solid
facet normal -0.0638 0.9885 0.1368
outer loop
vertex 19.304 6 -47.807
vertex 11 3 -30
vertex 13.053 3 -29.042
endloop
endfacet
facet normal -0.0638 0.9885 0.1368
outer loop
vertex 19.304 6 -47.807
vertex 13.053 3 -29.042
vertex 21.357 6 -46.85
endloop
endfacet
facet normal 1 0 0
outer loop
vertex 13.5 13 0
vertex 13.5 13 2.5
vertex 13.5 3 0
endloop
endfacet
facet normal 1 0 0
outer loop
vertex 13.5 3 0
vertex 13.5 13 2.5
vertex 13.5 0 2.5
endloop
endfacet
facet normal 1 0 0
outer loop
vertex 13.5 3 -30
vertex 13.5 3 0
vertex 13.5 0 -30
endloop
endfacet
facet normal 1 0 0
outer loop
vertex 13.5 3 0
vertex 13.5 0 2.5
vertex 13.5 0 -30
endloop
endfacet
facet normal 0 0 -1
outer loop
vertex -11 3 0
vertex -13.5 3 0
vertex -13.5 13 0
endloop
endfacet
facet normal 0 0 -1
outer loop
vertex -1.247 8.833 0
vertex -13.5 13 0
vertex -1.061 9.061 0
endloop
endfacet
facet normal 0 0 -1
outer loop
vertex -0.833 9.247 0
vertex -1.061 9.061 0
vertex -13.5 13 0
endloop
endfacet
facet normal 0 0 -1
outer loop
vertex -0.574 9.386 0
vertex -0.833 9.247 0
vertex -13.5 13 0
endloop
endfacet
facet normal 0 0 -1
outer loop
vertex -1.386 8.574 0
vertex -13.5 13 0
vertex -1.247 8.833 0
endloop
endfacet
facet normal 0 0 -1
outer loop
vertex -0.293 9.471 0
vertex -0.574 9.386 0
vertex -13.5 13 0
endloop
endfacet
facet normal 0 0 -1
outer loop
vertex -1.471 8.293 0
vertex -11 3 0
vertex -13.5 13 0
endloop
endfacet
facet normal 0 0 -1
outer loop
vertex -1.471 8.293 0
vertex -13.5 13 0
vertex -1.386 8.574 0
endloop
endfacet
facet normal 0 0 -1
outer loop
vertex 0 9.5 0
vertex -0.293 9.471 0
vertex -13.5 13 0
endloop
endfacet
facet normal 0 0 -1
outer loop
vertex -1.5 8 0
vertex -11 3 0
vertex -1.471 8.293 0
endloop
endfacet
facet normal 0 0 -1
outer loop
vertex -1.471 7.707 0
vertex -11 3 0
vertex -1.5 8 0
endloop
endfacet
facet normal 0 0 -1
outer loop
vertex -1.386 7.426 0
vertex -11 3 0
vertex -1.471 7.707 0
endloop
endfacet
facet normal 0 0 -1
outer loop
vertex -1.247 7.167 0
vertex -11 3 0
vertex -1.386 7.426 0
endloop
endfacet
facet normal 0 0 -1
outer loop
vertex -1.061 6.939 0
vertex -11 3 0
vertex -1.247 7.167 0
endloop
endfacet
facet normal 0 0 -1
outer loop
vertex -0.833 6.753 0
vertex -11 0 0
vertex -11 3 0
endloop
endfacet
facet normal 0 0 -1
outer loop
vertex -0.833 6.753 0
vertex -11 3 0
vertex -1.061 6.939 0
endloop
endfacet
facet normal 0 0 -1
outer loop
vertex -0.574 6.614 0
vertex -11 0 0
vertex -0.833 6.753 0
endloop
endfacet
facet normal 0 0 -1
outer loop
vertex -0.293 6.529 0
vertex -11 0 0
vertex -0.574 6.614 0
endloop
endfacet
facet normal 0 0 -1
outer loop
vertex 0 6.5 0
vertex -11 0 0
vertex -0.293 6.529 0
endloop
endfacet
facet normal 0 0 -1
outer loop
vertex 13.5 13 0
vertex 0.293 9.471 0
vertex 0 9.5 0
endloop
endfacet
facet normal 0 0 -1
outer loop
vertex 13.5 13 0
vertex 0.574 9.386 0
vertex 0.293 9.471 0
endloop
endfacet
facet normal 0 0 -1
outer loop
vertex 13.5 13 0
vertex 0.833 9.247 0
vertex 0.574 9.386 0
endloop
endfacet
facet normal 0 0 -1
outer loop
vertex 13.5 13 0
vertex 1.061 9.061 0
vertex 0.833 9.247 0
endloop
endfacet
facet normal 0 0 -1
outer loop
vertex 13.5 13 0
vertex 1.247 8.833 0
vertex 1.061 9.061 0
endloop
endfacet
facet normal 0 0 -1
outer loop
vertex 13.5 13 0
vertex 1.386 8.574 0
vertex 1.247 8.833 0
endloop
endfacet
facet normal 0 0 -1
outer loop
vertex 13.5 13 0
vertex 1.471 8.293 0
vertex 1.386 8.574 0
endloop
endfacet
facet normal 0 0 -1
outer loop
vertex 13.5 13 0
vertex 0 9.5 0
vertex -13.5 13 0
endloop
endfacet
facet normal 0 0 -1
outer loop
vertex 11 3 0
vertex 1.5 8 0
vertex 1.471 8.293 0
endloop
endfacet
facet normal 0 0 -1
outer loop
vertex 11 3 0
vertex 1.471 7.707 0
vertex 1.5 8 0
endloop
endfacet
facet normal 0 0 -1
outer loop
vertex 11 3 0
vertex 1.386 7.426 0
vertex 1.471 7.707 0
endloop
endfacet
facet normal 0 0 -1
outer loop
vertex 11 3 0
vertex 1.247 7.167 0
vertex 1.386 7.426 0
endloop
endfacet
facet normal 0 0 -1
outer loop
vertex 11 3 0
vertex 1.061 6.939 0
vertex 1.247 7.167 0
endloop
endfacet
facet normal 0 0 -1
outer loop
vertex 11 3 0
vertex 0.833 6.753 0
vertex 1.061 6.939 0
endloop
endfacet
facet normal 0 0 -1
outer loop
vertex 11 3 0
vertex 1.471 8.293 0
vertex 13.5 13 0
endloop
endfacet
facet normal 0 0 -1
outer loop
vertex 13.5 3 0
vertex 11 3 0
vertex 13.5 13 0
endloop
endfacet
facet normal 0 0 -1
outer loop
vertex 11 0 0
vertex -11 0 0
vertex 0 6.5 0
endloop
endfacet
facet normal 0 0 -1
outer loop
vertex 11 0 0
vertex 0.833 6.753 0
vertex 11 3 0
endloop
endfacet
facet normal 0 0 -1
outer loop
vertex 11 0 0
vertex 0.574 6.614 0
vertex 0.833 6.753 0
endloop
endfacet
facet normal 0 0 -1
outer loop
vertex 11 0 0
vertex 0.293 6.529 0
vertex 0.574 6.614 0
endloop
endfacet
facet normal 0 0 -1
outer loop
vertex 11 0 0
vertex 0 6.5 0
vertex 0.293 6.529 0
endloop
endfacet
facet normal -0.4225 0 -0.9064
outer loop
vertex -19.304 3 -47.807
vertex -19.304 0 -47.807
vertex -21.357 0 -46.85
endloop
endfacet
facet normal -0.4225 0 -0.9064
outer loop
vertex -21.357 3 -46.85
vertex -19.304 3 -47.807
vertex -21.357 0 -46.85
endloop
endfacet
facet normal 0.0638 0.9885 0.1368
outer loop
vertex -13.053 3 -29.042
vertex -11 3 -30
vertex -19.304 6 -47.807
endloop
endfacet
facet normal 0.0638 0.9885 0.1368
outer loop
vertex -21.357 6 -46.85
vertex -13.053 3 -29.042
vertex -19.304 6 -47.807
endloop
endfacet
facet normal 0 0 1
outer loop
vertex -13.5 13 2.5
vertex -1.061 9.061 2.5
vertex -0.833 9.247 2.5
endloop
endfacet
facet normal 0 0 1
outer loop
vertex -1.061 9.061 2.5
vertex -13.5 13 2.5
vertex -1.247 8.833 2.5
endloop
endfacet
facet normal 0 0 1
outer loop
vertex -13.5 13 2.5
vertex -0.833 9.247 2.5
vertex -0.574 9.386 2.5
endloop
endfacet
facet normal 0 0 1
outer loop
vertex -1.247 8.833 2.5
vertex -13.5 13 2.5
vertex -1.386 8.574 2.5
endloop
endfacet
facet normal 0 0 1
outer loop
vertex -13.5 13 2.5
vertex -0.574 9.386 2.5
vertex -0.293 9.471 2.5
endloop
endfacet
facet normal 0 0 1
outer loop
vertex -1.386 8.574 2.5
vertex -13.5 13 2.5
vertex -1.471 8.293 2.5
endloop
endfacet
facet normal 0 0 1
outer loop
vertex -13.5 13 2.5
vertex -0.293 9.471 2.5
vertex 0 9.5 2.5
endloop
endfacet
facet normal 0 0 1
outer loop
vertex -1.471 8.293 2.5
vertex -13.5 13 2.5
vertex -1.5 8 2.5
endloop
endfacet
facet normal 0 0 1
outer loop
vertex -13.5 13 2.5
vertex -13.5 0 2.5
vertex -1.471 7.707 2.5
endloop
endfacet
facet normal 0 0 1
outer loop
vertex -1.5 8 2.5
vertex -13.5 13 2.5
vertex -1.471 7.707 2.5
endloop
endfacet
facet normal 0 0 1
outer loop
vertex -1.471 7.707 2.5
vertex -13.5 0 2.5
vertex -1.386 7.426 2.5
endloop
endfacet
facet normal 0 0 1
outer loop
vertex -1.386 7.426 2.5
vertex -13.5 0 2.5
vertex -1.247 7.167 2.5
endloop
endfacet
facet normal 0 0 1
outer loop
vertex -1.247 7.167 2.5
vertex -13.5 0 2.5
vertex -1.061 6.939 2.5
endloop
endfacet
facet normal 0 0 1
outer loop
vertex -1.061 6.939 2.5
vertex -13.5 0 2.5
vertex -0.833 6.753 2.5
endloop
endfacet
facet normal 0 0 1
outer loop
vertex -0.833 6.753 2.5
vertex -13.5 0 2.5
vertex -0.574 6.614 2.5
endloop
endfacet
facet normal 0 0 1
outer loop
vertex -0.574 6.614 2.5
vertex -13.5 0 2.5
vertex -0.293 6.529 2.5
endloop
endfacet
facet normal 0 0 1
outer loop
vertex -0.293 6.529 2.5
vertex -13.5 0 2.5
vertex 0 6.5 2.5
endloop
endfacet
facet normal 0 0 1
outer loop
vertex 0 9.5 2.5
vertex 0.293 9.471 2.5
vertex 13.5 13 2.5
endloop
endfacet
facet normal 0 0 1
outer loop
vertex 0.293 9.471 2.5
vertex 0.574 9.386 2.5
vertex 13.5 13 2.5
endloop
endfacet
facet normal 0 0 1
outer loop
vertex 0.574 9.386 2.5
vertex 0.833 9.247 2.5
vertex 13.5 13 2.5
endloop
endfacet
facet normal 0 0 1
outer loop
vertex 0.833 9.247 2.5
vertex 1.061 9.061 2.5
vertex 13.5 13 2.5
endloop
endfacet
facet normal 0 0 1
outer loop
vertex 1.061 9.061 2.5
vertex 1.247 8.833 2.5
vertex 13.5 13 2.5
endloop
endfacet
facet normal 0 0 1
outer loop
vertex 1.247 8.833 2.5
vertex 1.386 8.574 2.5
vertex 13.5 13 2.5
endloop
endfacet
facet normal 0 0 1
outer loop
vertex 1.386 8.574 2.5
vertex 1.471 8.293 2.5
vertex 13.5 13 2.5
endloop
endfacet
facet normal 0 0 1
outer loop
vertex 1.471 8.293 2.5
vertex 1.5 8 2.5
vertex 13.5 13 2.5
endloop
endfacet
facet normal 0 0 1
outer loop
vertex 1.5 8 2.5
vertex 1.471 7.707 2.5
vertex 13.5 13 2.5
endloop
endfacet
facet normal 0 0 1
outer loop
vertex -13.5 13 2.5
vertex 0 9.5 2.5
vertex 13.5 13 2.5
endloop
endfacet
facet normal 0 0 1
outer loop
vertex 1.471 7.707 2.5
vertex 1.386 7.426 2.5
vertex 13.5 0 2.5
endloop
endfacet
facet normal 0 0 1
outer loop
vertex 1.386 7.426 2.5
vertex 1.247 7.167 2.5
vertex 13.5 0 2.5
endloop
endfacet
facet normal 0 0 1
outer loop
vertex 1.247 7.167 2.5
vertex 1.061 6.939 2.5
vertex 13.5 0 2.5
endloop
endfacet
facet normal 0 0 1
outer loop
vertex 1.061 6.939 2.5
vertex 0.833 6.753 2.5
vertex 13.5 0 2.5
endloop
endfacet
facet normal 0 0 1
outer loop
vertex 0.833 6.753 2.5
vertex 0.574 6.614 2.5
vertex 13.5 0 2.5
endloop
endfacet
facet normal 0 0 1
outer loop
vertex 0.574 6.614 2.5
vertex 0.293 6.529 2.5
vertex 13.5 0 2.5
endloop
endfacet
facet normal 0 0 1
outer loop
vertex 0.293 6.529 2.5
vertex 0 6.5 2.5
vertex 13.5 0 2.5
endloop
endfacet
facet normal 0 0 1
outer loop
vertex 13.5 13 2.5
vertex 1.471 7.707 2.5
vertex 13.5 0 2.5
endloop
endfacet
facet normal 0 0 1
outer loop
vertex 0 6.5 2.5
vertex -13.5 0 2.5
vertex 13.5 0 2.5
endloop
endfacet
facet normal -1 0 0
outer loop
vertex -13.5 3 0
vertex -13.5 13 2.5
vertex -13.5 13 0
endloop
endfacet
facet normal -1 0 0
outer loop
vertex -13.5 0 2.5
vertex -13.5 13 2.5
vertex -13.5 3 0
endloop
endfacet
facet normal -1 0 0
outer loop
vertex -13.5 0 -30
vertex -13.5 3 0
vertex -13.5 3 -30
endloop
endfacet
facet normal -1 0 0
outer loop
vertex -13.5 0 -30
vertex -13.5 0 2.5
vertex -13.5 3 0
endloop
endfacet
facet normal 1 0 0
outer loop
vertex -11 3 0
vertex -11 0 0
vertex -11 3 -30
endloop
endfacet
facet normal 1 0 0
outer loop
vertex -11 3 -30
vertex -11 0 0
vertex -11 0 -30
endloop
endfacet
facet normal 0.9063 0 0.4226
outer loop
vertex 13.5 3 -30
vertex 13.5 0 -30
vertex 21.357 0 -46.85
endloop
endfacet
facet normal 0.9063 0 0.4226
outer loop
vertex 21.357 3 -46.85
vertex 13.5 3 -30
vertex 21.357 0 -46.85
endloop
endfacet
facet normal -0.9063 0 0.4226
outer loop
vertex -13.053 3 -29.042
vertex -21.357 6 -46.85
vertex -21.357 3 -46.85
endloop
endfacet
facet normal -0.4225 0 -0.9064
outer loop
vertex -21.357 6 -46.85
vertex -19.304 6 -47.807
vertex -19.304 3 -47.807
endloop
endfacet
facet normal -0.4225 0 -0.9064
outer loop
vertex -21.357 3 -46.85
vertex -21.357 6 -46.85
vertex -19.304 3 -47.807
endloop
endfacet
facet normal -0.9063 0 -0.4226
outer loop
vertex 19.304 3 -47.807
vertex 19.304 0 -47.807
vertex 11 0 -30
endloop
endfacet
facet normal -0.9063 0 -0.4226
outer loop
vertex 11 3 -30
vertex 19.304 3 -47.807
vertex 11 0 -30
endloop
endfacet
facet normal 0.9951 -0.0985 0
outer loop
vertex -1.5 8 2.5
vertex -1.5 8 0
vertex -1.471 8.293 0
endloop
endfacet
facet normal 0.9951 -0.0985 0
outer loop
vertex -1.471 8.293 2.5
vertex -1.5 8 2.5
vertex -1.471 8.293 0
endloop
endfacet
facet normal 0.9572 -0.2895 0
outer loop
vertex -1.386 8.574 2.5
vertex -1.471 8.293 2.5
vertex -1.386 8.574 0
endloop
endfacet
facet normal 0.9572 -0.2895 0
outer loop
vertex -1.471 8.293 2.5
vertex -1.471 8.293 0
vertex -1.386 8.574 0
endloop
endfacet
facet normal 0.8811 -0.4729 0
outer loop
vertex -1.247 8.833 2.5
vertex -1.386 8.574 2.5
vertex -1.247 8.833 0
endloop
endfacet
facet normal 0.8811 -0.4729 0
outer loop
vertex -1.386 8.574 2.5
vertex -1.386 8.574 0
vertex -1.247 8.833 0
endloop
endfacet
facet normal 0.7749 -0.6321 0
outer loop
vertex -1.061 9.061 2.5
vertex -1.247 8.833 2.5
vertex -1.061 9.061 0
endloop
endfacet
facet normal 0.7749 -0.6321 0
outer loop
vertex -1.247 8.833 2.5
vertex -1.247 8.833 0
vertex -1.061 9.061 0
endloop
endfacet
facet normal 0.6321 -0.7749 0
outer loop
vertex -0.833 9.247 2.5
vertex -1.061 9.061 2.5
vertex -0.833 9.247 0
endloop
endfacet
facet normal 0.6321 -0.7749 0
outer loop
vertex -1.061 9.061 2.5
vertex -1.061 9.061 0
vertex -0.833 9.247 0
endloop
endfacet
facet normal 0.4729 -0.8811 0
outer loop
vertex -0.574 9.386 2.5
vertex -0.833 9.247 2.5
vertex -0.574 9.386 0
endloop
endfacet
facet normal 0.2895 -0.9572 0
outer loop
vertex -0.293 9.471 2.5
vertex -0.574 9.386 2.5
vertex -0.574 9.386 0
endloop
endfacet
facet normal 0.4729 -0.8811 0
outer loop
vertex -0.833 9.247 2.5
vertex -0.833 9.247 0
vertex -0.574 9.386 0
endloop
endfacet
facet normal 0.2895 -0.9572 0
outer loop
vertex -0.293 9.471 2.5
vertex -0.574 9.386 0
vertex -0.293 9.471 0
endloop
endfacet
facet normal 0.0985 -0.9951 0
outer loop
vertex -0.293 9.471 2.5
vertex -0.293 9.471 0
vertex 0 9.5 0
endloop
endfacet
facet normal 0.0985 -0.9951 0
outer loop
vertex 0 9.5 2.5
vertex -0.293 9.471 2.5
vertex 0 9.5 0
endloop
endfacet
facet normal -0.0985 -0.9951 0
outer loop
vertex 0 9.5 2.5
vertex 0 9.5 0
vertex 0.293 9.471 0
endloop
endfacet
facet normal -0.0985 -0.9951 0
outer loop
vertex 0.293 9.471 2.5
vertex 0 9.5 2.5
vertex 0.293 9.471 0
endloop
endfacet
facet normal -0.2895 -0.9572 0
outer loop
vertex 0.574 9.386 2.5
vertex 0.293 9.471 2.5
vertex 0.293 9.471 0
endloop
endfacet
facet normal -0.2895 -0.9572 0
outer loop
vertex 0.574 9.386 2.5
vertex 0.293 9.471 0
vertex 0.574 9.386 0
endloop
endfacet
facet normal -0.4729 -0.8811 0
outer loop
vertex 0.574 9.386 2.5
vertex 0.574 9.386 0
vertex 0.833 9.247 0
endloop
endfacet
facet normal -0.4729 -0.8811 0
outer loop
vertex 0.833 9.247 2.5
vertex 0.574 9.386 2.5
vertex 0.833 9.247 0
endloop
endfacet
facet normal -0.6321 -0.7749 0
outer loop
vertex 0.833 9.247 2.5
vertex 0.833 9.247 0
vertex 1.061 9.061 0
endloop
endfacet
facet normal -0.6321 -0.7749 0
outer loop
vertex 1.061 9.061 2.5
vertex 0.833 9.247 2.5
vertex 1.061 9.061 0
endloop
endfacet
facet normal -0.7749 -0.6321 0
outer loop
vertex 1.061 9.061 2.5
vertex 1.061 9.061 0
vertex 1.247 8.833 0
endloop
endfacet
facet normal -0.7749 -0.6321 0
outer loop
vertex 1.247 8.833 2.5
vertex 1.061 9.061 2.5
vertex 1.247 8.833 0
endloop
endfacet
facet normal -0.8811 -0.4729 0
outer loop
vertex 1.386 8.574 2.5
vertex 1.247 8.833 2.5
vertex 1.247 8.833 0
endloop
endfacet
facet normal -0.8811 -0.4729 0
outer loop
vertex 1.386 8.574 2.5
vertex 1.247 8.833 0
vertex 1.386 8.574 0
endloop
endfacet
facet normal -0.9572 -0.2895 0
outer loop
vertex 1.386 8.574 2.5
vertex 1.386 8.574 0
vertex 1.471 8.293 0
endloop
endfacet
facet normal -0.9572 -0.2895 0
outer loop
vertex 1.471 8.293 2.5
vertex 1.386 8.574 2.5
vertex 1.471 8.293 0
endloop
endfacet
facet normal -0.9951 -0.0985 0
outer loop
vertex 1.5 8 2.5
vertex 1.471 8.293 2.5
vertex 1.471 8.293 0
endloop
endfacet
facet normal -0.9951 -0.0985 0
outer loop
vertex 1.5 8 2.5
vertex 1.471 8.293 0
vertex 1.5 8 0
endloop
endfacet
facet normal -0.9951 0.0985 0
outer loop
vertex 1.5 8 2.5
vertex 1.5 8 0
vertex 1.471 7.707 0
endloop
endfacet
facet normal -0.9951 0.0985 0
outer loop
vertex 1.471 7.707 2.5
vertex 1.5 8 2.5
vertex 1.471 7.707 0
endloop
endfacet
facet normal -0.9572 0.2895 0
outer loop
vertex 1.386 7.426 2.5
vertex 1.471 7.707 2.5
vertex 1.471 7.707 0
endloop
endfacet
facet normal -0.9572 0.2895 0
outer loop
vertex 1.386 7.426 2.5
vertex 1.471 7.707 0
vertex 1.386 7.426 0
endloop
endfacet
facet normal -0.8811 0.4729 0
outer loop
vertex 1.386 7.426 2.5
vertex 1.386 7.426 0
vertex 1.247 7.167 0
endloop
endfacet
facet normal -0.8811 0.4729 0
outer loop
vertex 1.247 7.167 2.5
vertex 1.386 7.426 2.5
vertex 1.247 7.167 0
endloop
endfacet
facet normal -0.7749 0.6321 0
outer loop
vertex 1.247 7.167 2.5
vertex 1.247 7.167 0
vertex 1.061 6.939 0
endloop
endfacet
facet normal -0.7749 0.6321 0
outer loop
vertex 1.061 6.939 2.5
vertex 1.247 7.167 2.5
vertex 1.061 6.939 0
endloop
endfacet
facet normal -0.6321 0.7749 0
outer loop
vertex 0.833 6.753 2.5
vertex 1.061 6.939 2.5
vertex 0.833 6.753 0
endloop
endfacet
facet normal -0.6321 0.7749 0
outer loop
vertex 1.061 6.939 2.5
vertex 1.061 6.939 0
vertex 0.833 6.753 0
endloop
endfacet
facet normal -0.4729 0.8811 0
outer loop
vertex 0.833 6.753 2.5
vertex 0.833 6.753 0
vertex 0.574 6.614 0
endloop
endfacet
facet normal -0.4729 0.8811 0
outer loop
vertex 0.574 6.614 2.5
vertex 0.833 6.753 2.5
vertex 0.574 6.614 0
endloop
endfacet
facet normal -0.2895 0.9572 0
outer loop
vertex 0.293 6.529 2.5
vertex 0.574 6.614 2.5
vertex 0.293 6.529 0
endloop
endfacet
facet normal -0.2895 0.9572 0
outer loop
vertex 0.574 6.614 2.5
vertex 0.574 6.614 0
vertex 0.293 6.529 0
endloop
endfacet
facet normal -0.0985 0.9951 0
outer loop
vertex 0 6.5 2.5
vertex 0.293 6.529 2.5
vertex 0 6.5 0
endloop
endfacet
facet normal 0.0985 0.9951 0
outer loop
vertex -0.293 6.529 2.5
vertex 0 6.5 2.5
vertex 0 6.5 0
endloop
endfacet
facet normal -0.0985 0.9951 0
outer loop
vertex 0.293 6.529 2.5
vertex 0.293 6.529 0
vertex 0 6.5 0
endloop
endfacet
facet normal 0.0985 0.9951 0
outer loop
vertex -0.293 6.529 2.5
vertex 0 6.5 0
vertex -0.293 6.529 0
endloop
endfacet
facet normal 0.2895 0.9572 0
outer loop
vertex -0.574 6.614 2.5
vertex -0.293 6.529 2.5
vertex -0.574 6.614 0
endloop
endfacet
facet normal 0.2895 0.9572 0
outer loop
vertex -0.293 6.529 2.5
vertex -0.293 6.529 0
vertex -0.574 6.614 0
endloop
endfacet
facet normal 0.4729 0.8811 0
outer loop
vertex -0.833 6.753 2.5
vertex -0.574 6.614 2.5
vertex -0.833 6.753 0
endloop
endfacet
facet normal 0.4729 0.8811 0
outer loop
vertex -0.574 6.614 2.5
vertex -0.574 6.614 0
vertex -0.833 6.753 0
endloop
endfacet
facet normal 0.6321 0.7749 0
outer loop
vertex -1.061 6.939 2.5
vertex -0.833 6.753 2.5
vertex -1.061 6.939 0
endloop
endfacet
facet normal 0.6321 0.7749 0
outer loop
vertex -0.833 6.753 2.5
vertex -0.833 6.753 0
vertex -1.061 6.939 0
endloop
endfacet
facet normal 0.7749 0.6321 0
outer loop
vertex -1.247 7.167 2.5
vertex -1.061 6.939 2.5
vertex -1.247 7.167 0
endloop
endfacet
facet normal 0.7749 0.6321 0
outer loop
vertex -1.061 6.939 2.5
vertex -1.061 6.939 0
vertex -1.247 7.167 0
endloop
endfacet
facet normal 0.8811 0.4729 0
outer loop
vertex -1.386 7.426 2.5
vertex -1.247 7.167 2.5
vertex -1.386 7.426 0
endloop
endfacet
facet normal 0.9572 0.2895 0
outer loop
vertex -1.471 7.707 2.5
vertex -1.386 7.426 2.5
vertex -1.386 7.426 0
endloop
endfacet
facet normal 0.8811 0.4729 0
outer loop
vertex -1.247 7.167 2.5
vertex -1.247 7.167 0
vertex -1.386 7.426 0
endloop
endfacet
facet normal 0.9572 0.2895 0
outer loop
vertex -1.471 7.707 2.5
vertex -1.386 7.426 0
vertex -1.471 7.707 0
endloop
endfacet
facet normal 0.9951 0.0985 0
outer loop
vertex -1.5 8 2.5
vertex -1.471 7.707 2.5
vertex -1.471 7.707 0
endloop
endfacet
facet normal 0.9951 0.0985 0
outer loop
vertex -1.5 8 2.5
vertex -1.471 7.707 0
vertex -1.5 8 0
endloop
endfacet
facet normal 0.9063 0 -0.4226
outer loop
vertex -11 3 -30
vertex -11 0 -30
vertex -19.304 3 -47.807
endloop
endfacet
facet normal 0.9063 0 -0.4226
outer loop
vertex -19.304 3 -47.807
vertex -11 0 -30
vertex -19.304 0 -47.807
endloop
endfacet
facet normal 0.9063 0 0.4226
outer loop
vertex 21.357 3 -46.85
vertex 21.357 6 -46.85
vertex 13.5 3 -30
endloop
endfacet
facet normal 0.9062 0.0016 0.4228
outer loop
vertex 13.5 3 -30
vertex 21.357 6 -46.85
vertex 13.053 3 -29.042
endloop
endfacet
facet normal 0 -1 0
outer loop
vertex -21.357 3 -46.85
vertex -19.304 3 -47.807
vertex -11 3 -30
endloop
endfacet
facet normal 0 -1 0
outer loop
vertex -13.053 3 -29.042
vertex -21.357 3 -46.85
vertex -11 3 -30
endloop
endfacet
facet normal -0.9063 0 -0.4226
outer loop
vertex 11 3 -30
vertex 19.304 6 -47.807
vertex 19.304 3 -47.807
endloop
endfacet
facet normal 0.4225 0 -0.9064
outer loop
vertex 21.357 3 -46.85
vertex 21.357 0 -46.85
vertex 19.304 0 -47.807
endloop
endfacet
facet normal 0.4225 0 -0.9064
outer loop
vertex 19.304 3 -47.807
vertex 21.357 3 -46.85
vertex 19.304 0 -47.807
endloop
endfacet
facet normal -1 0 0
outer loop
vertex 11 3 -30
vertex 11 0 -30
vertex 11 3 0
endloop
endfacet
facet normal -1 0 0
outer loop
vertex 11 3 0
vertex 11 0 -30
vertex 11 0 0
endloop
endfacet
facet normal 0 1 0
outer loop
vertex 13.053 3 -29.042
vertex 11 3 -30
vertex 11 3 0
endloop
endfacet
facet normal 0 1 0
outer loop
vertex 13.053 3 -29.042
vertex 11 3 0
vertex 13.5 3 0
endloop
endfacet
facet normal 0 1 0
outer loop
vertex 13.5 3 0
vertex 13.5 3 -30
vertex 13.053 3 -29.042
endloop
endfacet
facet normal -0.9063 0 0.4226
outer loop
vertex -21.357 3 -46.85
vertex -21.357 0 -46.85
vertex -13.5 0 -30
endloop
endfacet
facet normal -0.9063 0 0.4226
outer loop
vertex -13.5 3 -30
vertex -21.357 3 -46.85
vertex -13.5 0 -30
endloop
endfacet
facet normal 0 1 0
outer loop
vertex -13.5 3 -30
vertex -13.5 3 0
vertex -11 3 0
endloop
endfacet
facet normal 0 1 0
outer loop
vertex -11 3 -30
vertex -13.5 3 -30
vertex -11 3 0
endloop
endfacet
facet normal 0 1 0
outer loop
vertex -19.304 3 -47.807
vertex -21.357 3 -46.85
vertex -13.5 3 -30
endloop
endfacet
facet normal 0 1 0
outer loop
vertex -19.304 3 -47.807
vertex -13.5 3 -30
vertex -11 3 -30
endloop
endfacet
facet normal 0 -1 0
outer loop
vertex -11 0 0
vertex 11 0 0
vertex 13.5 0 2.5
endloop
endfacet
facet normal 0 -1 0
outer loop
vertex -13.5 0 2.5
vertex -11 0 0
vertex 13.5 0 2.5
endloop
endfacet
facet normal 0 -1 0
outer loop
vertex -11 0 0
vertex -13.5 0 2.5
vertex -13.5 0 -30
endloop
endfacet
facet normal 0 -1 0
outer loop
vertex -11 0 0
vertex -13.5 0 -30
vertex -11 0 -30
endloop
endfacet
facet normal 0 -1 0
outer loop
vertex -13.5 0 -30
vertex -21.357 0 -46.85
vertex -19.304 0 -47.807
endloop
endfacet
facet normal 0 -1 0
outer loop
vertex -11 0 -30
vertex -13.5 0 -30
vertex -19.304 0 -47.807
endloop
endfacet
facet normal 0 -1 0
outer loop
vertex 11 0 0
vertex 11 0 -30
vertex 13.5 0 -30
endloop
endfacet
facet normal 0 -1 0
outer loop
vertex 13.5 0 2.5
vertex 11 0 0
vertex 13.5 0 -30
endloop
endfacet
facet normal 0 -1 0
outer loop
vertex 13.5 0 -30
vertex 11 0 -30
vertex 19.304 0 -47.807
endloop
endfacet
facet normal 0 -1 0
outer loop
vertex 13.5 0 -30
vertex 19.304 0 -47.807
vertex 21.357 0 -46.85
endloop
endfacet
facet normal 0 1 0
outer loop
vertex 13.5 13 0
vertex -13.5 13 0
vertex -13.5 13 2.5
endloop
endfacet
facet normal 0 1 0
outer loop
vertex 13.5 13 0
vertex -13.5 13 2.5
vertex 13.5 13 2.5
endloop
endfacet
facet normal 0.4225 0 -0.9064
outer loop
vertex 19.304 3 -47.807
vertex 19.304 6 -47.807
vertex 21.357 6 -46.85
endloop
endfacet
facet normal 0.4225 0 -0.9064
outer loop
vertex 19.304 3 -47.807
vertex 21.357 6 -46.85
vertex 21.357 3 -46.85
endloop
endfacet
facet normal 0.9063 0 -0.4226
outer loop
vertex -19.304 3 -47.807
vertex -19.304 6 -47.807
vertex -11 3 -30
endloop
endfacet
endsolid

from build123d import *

# Parameters (mm, degrees)
BOSS_EXTRUDE1_DEPTH = 3
BOSS_EXTRUDE2_DEPTH = 2.265769468
SKETCH3_W           = 27
SKETCH3_H           = 2.5
BOSS_EXTRUDE3_DEPTH = 10
SKETCH4_R           = 1.5
CUT_EXTRUDE1_DEPTH  = 54.950363002


with BuildPart() as part:
    # Sketch1 → Boss-Extrude1 (new body)
    with BuildSketch(Plane(origin=(0, 0, 0), x_dir=(1, 0, 0), z_dir=(0, 1, 0))):
        Polygon((-13.5, -2.5), (13.5, -2.5), (13.5, 30), (21.357064951, 46.849530162), (19.303580439, 47.807085716), (11, 30), (11, 0), (-11, 0), (-11, 30), (-19.303580439, 47.807085716), (-21.357064951, 46.849530162), (-13.5, 30), align=None)
    extrude(amount=BOSS_EXTRUDE1_DEPTH)


with BuildPart() as body_2:
    # Sketch2 → Boss-Extrude2 (new body)
    with BuildSketch(Plane(origin=(2.455334794, 0, -1.144941418), x_dir=(-0.42261826174070094, 0, -0.9063077870366493), z_dir=(0.9063077870366493, 0, -0.42261826174070094))):
        Polygon((31.83803449, 3), (51.48597967, 6), (51.48597967, 3), align=None)
    boss_extrude2 = extrude(amount=-BOSS_EXTRUDE2_DEPTH)


with BuildPart() as part_1:
    add(part.part)

    # Mirror4: Boss-Extrude2 across plane
    add(boss_extrude2.mirror(Plane(origin=(0, 0, 0), x_dir=(0, 0, 1), z_dir=(1, 0, 0))))

    # Sketch3 → Boss-Extrude3 (add)
    with BuildSketch(Plane(origin=(0, 3, 0), x_dir=(1, 0, 0), z_dir=(0, 1, 0))):
        with Locations((0, -1.25)):
            Rectangle(SKETCH3_W, SKETCH3_H)
    extrude(amount=BOSS_EXTRUDE3_DEPTH)

    # Sketch4 → Cut-Extrude1 (cut, through all)
    with BuildSketch(Plane(origin=(0, 0, 0), x_dir=(-1, 0, 0), z_dir=(0, 0, -1))):
        with Locations((0, 8)):
            Circle(SKETCH4_R)
    extrude(amount=-CUT_EXTRUDE1_DEPTH, mode=Mode.SUBTRACT)


solid = Compound([body_2.part, part_1.part])
